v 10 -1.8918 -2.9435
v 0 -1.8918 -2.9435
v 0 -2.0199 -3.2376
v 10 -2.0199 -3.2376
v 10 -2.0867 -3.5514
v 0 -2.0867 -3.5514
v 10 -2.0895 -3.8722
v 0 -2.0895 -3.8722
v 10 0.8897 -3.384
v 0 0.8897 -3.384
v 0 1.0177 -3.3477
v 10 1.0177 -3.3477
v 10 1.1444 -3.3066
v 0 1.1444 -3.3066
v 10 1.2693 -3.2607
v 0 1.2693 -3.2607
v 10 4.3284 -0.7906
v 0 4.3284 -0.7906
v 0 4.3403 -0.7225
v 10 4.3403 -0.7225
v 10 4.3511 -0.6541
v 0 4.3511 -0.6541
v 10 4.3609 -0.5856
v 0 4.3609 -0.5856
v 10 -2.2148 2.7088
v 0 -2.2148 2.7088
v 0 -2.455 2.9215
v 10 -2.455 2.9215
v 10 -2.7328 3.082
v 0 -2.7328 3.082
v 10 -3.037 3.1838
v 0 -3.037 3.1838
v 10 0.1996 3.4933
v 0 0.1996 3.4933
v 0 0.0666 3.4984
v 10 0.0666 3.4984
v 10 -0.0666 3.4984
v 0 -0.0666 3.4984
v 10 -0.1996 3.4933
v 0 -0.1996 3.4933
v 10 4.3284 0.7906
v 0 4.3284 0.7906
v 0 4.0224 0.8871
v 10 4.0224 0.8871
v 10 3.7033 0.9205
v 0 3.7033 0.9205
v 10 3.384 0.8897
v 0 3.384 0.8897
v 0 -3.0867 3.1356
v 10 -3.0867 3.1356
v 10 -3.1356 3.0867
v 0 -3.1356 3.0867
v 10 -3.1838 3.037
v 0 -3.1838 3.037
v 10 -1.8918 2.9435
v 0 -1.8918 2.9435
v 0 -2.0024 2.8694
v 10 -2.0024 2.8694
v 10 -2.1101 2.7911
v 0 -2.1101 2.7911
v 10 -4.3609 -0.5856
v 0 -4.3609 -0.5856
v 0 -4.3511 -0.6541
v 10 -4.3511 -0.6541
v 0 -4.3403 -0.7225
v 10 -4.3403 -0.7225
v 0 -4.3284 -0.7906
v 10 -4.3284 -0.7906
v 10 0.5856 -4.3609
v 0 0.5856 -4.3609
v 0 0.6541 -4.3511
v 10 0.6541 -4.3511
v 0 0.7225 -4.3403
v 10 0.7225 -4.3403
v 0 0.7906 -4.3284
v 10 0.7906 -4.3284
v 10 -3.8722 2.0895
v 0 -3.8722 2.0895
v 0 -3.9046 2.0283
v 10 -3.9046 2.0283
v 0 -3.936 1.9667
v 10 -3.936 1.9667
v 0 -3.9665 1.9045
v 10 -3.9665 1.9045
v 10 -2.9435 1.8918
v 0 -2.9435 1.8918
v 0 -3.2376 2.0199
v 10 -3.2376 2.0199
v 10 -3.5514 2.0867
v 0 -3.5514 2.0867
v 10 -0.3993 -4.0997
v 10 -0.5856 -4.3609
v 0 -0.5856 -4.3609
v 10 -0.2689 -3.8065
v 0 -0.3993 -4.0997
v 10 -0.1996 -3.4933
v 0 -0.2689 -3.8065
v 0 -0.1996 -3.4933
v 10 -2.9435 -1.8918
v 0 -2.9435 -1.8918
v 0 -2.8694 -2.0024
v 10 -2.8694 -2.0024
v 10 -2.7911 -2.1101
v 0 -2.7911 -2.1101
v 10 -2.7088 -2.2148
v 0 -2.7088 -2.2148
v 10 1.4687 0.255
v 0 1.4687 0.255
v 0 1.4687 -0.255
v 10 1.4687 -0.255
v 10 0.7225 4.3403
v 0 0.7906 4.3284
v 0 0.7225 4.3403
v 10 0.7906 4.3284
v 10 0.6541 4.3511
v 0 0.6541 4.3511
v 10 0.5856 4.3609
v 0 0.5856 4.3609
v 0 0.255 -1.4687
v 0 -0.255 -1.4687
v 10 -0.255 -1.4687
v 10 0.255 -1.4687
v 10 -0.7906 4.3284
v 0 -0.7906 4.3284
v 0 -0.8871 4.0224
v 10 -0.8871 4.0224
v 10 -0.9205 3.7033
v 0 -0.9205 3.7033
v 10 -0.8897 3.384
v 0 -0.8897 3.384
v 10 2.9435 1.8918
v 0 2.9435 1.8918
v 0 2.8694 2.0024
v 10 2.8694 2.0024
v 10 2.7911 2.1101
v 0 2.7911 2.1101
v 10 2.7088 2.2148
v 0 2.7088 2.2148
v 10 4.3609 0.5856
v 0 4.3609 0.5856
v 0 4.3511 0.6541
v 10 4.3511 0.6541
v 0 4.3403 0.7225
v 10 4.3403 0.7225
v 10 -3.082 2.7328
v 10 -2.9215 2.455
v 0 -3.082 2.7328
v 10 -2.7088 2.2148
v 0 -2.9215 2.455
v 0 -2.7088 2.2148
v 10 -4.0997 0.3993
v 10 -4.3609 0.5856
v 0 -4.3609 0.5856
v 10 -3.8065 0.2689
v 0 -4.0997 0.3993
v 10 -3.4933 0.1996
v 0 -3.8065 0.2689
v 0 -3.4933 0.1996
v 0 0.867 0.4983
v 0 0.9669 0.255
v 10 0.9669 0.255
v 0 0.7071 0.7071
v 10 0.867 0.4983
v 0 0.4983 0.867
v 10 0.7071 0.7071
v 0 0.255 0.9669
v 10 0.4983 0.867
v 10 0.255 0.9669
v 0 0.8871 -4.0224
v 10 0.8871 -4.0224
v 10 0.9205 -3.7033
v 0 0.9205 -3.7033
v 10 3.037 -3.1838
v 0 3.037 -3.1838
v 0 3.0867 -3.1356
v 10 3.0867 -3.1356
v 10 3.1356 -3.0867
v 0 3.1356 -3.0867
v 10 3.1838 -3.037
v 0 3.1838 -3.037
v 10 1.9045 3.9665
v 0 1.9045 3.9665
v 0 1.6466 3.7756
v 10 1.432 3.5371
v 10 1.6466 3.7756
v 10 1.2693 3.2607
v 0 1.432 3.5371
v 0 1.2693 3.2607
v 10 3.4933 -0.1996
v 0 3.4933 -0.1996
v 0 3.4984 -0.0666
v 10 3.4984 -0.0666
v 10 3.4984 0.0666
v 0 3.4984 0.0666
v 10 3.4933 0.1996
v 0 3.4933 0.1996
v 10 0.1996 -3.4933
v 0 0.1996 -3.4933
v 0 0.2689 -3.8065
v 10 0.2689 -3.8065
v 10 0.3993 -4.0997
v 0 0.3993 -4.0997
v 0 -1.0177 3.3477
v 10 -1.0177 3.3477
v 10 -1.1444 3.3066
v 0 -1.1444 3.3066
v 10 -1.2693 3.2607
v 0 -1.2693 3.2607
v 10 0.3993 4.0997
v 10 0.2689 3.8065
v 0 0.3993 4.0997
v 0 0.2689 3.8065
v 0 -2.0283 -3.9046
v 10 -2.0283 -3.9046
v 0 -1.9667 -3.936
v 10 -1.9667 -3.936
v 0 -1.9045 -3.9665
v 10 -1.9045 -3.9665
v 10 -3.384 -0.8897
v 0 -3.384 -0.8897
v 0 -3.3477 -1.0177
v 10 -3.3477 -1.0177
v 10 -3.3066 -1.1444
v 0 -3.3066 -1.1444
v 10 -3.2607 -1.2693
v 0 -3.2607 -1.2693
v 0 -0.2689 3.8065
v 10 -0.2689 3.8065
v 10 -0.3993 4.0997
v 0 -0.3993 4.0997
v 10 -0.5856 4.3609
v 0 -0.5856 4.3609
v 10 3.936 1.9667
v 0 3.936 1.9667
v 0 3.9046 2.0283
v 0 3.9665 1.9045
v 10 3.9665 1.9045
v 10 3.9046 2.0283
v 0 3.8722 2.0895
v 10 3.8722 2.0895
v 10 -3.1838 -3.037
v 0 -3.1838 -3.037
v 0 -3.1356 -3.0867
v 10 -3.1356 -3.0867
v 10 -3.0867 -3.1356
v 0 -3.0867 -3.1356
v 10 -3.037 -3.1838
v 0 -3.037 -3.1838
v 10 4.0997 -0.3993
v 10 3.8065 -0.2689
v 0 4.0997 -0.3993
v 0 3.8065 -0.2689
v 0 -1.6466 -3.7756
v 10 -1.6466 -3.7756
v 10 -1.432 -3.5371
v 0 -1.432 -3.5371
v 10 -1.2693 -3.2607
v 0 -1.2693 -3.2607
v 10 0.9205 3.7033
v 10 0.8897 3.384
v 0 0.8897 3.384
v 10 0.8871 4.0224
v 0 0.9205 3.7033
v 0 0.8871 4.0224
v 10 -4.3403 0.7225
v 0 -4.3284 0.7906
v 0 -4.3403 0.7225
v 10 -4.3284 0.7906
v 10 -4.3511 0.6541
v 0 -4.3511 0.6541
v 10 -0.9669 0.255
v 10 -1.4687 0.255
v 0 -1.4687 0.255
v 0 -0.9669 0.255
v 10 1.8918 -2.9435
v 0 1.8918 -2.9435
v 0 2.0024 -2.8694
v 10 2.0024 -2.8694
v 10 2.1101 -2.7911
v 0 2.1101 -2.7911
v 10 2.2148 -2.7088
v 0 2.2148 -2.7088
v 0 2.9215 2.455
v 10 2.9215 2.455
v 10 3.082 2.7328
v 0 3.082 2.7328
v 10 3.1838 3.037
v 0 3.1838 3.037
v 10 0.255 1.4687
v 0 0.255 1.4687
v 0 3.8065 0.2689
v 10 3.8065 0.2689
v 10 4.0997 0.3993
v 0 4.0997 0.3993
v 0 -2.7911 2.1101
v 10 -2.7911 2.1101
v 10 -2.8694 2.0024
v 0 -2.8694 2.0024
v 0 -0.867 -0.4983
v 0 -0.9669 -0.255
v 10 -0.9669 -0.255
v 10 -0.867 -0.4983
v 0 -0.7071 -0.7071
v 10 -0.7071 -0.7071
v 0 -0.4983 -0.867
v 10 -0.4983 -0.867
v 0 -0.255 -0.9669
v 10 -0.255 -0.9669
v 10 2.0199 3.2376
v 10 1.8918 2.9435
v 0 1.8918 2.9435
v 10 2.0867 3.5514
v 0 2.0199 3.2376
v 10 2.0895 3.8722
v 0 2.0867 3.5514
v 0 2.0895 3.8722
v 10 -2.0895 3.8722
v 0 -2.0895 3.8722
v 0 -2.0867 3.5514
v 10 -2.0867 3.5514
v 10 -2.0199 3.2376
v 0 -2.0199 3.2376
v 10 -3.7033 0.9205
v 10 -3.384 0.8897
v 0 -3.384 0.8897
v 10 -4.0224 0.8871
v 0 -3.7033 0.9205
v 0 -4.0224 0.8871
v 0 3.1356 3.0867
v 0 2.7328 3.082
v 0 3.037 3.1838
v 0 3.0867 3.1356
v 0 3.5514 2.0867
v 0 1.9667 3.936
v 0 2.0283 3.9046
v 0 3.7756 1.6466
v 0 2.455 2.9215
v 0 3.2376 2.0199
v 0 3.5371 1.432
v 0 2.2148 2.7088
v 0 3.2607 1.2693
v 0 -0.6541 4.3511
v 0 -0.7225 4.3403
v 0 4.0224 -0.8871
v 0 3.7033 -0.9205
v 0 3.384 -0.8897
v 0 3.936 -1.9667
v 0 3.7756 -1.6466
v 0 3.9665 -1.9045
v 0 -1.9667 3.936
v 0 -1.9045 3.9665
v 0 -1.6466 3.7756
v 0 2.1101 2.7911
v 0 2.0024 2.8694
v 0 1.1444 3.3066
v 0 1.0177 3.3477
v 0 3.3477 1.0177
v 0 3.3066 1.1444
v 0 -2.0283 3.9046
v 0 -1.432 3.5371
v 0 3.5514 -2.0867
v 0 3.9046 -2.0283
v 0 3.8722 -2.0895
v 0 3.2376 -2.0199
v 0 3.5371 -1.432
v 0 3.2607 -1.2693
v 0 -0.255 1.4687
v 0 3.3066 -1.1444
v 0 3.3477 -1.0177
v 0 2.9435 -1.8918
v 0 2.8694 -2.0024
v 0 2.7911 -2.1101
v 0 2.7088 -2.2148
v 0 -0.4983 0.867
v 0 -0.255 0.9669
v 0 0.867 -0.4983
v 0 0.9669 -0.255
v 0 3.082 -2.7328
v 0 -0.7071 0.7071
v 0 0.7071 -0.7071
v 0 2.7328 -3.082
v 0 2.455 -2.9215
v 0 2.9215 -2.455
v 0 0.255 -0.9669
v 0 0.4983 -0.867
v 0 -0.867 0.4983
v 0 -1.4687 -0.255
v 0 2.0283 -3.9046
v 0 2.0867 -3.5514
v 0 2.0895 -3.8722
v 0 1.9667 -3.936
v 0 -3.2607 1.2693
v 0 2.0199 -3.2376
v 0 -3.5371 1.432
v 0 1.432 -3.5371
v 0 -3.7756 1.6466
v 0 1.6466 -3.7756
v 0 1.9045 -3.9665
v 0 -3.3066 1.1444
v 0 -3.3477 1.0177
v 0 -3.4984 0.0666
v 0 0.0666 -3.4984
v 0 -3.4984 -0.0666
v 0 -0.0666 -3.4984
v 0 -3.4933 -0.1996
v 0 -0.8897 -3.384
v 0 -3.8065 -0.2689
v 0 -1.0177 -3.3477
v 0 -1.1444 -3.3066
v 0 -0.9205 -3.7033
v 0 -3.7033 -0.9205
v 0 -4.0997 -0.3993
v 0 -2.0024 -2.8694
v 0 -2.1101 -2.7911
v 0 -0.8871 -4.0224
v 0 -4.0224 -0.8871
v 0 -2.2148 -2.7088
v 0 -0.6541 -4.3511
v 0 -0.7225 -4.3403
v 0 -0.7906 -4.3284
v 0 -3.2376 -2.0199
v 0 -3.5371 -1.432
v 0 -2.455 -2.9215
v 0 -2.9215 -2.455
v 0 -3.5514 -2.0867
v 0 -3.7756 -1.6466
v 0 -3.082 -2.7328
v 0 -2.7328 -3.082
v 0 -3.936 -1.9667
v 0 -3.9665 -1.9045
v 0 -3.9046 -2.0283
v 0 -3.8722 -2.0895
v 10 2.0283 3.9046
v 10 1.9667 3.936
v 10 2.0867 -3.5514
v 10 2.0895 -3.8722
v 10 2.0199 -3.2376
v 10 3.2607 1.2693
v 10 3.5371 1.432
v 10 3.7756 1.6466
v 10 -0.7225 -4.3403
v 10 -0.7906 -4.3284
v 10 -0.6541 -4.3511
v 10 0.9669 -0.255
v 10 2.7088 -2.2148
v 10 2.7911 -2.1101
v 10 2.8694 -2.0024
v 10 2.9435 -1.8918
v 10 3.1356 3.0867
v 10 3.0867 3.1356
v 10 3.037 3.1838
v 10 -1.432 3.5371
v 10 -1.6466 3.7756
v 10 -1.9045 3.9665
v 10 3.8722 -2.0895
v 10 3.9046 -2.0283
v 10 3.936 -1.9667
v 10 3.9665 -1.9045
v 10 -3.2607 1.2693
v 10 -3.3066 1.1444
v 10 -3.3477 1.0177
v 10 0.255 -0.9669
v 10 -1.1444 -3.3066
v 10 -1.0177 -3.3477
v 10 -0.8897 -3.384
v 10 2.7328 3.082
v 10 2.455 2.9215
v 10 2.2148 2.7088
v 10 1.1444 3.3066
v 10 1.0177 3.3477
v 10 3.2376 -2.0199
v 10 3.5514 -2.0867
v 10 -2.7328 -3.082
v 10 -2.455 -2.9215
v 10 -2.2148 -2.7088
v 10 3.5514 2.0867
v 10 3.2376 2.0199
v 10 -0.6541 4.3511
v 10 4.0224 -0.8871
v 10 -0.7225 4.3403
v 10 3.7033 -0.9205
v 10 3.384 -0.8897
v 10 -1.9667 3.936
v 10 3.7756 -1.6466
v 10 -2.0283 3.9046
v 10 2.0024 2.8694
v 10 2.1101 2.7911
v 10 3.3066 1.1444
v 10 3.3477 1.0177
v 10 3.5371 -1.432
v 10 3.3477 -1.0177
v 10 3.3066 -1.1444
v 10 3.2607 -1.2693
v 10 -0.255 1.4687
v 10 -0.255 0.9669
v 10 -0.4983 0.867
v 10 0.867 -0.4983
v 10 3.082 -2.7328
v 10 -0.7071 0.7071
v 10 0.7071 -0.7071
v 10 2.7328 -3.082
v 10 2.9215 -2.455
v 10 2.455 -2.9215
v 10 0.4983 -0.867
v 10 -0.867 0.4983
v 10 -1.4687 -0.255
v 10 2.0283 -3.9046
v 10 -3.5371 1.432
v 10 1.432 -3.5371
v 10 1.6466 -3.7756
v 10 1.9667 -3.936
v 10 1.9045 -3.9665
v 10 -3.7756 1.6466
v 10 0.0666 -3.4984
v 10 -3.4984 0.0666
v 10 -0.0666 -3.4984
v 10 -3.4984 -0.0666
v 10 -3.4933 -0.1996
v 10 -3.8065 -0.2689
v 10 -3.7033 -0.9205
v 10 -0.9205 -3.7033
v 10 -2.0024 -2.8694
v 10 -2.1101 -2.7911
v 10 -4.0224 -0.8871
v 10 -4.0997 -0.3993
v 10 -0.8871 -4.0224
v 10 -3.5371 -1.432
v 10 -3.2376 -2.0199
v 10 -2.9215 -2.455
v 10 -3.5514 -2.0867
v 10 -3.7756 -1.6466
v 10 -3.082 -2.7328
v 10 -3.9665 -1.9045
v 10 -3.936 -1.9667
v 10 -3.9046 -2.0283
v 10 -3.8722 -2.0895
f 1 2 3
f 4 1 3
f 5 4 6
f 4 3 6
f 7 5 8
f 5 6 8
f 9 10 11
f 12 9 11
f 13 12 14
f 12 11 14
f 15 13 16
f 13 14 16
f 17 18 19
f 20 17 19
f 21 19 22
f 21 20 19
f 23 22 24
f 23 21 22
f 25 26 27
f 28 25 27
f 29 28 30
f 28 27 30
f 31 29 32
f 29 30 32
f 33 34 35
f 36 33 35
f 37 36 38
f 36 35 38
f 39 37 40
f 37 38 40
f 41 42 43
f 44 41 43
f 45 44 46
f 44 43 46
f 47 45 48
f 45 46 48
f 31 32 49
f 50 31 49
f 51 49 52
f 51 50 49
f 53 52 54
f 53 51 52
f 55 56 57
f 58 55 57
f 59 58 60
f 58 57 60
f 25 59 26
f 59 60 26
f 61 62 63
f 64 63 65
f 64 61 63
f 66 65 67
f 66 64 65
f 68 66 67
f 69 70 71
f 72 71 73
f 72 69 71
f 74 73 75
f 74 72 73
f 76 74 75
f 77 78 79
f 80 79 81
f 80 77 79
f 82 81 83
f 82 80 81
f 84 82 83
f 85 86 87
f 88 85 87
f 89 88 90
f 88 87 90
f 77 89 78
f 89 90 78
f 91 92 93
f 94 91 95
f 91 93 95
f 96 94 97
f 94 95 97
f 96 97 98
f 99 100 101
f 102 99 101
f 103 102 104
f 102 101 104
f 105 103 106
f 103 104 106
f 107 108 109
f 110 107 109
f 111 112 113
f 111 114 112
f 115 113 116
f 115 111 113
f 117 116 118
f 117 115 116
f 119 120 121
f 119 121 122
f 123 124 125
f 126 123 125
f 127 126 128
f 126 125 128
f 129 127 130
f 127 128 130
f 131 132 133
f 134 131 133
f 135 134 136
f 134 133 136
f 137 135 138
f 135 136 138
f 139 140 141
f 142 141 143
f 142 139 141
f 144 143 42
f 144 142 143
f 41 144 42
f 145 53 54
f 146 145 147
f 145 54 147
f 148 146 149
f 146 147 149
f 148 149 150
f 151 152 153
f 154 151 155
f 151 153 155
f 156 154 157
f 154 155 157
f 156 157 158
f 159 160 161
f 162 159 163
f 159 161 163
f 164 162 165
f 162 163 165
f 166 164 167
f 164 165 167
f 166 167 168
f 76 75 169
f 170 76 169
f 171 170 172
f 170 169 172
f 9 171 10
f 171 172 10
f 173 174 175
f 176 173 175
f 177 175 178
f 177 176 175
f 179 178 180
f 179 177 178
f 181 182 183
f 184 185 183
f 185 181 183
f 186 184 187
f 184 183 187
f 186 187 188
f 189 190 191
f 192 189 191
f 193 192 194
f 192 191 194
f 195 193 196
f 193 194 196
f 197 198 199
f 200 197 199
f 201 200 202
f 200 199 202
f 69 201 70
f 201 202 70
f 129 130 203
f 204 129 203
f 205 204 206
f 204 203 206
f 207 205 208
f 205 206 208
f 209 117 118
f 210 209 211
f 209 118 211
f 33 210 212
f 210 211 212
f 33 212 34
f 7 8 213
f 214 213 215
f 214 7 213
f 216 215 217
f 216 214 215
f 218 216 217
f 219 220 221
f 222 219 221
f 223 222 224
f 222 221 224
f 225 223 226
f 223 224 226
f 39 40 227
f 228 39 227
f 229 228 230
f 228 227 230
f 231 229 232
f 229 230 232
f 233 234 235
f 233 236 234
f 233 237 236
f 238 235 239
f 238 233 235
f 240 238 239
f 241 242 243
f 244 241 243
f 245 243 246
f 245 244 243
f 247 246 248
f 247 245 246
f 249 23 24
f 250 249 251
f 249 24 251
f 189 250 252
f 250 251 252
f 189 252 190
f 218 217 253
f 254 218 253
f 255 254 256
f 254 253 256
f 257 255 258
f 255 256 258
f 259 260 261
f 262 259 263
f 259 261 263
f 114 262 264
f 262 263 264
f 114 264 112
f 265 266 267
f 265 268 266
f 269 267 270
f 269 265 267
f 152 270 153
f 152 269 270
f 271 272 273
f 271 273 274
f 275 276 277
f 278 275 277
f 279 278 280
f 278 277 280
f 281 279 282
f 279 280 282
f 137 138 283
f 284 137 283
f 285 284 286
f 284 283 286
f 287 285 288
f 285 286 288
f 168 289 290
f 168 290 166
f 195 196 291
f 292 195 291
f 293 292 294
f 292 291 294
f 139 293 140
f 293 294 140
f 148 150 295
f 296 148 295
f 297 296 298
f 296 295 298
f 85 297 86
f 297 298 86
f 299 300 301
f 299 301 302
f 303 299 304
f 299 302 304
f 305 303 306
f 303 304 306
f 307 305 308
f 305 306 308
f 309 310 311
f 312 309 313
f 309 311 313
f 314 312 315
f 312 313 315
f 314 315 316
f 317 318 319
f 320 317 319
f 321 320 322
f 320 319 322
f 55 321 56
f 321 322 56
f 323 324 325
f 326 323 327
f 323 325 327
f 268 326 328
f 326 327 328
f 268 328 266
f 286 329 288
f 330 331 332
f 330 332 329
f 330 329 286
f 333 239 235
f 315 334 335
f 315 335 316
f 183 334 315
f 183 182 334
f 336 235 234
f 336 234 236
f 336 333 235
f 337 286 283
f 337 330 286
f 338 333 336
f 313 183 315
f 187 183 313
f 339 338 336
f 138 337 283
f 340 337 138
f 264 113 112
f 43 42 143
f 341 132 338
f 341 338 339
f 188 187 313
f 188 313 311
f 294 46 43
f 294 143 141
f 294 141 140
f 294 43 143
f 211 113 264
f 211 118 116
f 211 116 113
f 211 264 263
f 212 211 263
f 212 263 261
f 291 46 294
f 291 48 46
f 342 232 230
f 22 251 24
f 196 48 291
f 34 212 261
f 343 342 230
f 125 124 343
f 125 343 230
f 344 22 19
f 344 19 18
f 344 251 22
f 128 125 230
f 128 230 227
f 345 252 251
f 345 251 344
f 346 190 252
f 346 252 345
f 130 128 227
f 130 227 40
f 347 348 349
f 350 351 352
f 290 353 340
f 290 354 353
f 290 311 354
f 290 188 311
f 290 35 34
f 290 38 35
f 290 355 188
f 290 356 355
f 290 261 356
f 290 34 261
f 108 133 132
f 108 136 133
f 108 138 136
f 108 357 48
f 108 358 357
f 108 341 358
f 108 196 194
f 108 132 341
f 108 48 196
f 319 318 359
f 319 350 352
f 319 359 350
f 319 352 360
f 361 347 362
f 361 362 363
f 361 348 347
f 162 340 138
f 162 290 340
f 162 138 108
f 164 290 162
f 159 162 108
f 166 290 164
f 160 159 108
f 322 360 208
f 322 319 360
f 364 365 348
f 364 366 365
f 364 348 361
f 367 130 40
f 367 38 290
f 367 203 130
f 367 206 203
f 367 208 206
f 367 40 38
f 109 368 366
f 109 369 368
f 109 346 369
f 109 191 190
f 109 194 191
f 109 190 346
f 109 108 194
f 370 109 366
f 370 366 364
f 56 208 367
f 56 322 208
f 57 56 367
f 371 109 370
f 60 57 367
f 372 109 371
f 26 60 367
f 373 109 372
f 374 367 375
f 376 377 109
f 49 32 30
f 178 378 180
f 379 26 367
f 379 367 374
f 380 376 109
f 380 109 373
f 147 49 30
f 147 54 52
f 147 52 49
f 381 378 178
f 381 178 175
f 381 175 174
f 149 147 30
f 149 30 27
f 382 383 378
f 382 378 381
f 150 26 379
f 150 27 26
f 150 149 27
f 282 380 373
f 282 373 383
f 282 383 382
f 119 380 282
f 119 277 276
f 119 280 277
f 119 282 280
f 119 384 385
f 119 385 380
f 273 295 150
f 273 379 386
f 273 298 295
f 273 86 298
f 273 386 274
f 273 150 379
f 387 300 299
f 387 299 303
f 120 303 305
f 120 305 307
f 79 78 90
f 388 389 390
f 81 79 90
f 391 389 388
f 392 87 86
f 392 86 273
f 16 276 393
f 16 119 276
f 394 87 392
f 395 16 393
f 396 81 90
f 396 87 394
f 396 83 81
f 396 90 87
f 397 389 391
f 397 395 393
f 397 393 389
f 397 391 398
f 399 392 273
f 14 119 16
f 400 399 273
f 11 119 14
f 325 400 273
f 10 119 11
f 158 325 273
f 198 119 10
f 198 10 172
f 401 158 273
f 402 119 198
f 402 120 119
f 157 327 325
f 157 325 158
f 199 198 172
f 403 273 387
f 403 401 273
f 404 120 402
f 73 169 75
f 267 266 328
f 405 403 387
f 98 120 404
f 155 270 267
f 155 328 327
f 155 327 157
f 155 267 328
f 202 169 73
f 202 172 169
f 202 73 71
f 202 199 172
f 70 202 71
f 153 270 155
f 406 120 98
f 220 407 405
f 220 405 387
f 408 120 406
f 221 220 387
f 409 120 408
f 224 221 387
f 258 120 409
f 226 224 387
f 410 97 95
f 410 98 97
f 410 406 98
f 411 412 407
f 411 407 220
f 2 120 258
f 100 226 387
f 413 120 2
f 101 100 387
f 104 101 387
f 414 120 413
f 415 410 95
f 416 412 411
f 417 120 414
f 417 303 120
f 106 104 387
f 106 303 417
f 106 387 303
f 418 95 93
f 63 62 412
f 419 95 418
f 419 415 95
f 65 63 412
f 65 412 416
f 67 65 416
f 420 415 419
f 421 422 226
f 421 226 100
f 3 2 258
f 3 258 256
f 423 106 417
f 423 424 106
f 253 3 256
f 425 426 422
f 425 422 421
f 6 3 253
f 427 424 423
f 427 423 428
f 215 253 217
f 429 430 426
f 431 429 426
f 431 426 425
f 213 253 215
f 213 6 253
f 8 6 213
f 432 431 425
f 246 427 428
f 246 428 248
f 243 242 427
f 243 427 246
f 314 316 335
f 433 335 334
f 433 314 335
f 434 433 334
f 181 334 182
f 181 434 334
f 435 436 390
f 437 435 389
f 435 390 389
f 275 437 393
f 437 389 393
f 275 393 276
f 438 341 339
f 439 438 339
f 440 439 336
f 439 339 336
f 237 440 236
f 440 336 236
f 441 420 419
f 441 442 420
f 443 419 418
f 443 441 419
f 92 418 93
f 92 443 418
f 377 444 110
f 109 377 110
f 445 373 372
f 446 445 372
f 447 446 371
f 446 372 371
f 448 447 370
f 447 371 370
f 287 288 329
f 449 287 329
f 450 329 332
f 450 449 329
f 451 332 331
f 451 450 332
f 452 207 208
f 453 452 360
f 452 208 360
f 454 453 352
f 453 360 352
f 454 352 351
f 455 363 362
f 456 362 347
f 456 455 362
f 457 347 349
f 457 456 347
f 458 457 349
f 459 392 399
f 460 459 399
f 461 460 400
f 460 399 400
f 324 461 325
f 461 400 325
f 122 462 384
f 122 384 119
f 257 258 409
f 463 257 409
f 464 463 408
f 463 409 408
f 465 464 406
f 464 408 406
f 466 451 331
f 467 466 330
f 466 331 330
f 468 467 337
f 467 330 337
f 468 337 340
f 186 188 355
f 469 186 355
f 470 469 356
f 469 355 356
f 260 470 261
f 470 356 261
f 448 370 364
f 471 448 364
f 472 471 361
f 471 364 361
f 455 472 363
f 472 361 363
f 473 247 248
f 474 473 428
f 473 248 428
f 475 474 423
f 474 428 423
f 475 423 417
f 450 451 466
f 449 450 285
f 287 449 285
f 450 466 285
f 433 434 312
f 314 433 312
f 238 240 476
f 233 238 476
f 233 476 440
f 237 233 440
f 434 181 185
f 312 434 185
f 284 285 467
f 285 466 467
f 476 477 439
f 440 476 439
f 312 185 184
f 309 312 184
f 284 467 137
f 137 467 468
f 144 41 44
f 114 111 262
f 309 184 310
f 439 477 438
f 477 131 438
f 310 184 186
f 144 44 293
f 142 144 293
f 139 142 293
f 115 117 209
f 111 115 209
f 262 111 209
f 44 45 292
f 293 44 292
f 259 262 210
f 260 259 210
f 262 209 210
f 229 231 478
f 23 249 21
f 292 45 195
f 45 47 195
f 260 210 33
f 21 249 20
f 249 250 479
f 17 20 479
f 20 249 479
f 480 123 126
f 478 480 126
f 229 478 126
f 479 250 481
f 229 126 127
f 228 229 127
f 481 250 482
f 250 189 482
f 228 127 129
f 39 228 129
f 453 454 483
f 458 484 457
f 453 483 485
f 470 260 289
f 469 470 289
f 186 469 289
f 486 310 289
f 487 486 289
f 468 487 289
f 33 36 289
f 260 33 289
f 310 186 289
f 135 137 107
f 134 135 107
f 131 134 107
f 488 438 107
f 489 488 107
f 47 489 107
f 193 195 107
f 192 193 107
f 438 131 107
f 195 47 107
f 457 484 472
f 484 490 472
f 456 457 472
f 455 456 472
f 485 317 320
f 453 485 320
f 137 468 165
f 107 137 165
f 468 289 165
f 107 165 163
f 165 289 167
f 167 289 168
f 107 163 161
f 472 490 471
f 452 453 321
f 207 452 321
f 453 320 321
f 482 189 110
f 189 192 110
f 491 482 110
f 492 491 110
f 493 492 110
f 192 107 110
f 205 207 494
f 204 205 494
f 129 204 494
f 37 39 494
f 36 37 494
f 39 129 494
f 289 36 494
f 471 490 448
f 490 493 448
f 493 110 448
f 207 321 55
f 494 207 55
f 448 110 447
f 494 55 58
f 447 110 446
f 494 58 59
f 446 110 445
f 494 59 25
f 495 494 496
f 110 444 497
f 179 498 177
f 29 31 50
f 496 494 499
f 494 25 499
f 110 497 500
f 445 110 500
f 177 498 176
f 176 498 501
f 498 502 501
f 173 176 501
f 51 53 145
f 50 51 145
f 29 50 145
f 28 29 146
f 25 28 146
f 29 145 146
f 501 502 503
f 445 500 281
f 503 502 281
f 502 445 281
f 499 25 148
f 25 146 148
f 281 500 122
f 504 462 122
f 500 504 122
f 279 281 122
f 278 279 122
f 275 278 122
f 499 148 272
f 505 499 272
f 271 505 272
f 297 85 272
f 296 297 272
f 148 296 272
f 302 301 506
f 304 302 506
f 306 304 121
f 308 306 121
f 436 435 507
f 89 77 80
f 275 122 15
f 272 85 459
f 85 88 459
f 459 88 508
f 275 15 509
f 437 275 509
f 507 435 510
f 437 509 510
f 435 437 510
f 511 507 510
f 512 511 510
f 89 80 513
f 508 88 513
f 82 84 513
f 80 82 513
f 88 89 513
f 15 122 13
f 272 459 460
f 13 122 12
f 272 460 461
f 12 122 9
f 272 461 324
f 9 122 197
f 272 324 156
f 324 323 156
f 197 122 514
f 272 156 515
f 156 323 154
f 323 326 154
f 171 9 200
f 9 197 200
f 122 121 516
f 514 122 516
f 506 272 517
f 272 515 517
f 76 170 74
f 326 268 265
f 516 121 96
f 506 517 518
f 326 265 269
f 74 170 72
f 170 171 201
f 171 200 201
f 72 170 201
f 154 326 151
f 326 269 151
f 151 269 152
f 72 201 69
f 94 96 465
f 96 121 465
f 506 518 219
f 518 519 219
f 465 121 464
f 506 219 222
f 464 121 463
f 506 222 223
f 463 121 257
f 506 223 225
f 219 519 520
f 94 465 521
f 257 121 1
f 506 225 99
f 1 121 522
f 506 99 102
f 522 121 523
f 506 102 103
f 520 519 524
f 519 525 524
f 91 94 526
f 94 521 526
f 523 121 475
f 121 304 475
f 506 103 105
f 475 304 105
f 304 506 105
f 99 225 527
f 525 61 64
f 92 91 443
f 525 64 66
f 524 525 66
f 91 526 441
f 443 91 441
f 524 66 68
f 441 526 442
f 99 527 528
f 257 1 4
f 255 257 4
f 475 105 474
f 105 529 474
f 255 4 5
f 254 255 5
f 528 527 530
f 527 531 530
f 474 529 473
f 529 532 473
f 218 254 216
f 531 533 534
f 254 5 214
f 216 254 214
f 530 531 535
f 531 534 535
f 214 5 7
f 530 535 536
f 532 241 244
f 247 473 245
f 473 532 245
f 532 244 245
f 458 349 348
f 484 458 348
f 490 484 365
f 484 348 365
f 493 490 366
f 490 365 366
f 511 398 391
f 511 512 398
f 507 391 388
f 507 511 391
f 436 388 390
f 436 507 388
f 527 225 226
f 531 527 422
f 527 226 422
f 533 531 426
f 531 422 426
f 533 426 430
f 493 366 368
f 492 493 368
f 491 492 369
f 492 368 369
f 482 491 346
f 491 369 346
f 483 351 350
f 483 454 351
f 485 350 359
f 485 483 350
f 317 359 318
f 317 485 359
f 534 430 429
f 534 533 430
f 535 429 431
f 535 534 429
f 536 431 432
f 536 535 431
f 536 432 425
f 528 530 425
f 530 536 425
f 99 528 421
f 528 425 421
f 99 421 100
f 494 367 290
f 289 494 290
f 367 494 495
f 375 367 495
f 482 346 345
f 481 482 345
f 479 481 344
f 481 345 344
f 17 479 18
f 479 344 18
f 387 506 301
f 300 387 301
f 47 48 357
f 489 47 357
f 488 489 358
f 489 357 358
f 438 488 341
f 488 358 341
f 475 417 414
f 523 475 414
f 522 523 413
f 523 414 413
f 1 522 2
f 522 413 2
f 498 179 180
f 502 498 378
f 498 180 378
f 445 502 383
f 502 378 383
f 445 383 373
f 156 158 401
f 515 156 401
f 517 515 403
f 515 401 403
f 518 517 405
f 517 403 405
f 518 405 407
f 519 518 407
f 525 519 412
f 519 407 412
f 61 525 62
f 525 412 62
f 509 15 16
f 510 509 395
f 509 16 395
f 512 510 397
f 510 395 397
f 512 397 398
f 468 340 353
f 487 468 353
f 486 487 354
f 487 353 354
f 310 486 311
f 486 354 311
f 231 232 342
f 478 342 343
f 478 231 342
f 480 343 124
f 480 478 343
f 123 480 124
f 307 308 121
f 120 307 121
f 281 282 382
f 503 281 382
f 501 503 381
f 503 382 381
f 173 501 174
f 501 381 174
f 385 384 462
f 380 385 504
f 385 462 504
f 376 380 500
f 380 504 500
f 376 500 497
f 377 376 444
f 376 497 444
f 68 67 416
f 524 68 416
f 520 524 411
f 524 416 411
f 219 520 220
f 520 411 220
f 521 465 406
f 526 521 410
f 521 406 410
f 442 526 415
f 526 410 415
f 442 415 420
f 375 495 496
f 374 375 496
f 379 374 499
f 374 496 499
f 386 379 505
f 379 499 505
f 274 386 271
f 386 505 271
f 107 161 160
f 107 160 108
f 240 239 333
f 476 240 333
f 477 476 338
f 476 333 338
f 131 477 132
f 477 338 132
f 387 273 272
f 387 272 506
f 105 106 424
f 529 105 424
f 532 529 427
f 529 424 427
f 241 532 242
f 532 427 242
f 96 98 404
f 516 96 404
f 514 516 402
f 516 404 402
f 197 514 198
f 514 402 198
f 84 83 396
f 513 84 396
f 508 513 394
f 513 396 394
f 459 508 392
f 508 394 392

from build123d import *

# Parameters (mm, degrees)
BASPROSKE_W        = 10
BASPROSKE_H        = 4.4
TOOTHCUT_DEPTH     = 12.777945491
TEETHCUTS_COUNT    = 20
TEETHCUTS_ANGLE    = 342
BORSKE_R           = 1
BORE_DEPTH         = 50.0000508
SKETCH1_W          = 0.51
SKETCH1_H          = 0.51
CUT_EXTRUDE1_DEPTH = 100


with BuildPart() as part:
    # BasProSke → Base-Revolve (revolve)
    with BuildSketch(Plane(origin=(0, 0, 0), x_dir=(1, 0, 0), z_dir=(0, 1, 0)), mode=Mode.PRIVATE) as base_revolve_sk:
        with Locations((5, 2.2)):
            Rectangle(BASPROSKE_W, BASPROSKE_H)
    revolve(base_revolve_sk.sketch.rotate(Axis((-10, 0, 0), (1, 0, 0)), 180), axis=Axis((-10, 0, 0), (1, 0, 0)))

    # TooCutSke → ToothCut (cut, through all)
    with BuildSketch(Plane(origin=(0, 0, 0), x_dir=(0, 0, -1), z_dir=(1, 0, 0))):
        with BuildLine():
            ThreePointArc((0.199592598, 3.493302706), (0, 3.499), (-0.199592598, 3.493302706))
            ThreePointArc((-0.199592598, 3.493302706), (-0.333052166, 3.970347354), (-0.606028648, 4.383707841))
            ThreePointArc((-0.606028648, 4.383707841), (0, 4.4254), (0.606028648, 4.383707841))
            ThreePointArc((0.606028648, 4.383707841), (0.333052166, 3.970347354), (0.199592598, 3.493302706))
        make_face()
    toothcut = extrude(amount=TOOTHCUT_DEPTH, mode=Mode.SUBTRACT)

    # TeethCuts: ToothCut ×20 about axis
    teethcuts_axis = Axis((-10, 0, 0), (1, 0, 0))
    for i in range(1, TEETHCUTS_COUNT):
        add(toothcut.rotate(teethcuts_axis, i * TEETHCUTS_ANGLE / (TEETHCUTS_COUNT - 1)), mode=Mode.SUBTRACT)

    # BorSke → Bore (cut, symmetric)
    with BuildSketch(Plane(origin=(0, 0, 0), x_dir=(0, 0, -1), z_dir=(1, 0, 0))):
        with Locations(Location((0, 0, 0), (0, 0, 180))):
            Circle(BORSKE_R)
    extrude(amount=BORE_DEPTH, both=True, mode=Mode.SUBTRACT)

    # Sketch1 → Cut-Extrude1 (cut)
    with BuildSketch(Plane(origin=(10, 0, 0), x_dir=(0, 0, -1), z_dir=(1, 0, 0))):
        with Locations((0, 1.213665218)):
            Rectangle(SKETCH1_W, SKETCH1_H)
        with Locations((1.213665218, 0)):
            Rectangle(SKETCH1_W, SKETCH1_H)
        with Locations((0, -1.213665218)):
            Rectangle(SKETCH1_W, SKETCH1_H)
        with Locations((-1.213665218, 0)):
            Rectangle(SKETCH1_W, SKETCH1_H)
    extrude(amount=-CUT_EXTRUDE1_DEPTH, mode=Mode.SUBTRACT)


solid = part.part
